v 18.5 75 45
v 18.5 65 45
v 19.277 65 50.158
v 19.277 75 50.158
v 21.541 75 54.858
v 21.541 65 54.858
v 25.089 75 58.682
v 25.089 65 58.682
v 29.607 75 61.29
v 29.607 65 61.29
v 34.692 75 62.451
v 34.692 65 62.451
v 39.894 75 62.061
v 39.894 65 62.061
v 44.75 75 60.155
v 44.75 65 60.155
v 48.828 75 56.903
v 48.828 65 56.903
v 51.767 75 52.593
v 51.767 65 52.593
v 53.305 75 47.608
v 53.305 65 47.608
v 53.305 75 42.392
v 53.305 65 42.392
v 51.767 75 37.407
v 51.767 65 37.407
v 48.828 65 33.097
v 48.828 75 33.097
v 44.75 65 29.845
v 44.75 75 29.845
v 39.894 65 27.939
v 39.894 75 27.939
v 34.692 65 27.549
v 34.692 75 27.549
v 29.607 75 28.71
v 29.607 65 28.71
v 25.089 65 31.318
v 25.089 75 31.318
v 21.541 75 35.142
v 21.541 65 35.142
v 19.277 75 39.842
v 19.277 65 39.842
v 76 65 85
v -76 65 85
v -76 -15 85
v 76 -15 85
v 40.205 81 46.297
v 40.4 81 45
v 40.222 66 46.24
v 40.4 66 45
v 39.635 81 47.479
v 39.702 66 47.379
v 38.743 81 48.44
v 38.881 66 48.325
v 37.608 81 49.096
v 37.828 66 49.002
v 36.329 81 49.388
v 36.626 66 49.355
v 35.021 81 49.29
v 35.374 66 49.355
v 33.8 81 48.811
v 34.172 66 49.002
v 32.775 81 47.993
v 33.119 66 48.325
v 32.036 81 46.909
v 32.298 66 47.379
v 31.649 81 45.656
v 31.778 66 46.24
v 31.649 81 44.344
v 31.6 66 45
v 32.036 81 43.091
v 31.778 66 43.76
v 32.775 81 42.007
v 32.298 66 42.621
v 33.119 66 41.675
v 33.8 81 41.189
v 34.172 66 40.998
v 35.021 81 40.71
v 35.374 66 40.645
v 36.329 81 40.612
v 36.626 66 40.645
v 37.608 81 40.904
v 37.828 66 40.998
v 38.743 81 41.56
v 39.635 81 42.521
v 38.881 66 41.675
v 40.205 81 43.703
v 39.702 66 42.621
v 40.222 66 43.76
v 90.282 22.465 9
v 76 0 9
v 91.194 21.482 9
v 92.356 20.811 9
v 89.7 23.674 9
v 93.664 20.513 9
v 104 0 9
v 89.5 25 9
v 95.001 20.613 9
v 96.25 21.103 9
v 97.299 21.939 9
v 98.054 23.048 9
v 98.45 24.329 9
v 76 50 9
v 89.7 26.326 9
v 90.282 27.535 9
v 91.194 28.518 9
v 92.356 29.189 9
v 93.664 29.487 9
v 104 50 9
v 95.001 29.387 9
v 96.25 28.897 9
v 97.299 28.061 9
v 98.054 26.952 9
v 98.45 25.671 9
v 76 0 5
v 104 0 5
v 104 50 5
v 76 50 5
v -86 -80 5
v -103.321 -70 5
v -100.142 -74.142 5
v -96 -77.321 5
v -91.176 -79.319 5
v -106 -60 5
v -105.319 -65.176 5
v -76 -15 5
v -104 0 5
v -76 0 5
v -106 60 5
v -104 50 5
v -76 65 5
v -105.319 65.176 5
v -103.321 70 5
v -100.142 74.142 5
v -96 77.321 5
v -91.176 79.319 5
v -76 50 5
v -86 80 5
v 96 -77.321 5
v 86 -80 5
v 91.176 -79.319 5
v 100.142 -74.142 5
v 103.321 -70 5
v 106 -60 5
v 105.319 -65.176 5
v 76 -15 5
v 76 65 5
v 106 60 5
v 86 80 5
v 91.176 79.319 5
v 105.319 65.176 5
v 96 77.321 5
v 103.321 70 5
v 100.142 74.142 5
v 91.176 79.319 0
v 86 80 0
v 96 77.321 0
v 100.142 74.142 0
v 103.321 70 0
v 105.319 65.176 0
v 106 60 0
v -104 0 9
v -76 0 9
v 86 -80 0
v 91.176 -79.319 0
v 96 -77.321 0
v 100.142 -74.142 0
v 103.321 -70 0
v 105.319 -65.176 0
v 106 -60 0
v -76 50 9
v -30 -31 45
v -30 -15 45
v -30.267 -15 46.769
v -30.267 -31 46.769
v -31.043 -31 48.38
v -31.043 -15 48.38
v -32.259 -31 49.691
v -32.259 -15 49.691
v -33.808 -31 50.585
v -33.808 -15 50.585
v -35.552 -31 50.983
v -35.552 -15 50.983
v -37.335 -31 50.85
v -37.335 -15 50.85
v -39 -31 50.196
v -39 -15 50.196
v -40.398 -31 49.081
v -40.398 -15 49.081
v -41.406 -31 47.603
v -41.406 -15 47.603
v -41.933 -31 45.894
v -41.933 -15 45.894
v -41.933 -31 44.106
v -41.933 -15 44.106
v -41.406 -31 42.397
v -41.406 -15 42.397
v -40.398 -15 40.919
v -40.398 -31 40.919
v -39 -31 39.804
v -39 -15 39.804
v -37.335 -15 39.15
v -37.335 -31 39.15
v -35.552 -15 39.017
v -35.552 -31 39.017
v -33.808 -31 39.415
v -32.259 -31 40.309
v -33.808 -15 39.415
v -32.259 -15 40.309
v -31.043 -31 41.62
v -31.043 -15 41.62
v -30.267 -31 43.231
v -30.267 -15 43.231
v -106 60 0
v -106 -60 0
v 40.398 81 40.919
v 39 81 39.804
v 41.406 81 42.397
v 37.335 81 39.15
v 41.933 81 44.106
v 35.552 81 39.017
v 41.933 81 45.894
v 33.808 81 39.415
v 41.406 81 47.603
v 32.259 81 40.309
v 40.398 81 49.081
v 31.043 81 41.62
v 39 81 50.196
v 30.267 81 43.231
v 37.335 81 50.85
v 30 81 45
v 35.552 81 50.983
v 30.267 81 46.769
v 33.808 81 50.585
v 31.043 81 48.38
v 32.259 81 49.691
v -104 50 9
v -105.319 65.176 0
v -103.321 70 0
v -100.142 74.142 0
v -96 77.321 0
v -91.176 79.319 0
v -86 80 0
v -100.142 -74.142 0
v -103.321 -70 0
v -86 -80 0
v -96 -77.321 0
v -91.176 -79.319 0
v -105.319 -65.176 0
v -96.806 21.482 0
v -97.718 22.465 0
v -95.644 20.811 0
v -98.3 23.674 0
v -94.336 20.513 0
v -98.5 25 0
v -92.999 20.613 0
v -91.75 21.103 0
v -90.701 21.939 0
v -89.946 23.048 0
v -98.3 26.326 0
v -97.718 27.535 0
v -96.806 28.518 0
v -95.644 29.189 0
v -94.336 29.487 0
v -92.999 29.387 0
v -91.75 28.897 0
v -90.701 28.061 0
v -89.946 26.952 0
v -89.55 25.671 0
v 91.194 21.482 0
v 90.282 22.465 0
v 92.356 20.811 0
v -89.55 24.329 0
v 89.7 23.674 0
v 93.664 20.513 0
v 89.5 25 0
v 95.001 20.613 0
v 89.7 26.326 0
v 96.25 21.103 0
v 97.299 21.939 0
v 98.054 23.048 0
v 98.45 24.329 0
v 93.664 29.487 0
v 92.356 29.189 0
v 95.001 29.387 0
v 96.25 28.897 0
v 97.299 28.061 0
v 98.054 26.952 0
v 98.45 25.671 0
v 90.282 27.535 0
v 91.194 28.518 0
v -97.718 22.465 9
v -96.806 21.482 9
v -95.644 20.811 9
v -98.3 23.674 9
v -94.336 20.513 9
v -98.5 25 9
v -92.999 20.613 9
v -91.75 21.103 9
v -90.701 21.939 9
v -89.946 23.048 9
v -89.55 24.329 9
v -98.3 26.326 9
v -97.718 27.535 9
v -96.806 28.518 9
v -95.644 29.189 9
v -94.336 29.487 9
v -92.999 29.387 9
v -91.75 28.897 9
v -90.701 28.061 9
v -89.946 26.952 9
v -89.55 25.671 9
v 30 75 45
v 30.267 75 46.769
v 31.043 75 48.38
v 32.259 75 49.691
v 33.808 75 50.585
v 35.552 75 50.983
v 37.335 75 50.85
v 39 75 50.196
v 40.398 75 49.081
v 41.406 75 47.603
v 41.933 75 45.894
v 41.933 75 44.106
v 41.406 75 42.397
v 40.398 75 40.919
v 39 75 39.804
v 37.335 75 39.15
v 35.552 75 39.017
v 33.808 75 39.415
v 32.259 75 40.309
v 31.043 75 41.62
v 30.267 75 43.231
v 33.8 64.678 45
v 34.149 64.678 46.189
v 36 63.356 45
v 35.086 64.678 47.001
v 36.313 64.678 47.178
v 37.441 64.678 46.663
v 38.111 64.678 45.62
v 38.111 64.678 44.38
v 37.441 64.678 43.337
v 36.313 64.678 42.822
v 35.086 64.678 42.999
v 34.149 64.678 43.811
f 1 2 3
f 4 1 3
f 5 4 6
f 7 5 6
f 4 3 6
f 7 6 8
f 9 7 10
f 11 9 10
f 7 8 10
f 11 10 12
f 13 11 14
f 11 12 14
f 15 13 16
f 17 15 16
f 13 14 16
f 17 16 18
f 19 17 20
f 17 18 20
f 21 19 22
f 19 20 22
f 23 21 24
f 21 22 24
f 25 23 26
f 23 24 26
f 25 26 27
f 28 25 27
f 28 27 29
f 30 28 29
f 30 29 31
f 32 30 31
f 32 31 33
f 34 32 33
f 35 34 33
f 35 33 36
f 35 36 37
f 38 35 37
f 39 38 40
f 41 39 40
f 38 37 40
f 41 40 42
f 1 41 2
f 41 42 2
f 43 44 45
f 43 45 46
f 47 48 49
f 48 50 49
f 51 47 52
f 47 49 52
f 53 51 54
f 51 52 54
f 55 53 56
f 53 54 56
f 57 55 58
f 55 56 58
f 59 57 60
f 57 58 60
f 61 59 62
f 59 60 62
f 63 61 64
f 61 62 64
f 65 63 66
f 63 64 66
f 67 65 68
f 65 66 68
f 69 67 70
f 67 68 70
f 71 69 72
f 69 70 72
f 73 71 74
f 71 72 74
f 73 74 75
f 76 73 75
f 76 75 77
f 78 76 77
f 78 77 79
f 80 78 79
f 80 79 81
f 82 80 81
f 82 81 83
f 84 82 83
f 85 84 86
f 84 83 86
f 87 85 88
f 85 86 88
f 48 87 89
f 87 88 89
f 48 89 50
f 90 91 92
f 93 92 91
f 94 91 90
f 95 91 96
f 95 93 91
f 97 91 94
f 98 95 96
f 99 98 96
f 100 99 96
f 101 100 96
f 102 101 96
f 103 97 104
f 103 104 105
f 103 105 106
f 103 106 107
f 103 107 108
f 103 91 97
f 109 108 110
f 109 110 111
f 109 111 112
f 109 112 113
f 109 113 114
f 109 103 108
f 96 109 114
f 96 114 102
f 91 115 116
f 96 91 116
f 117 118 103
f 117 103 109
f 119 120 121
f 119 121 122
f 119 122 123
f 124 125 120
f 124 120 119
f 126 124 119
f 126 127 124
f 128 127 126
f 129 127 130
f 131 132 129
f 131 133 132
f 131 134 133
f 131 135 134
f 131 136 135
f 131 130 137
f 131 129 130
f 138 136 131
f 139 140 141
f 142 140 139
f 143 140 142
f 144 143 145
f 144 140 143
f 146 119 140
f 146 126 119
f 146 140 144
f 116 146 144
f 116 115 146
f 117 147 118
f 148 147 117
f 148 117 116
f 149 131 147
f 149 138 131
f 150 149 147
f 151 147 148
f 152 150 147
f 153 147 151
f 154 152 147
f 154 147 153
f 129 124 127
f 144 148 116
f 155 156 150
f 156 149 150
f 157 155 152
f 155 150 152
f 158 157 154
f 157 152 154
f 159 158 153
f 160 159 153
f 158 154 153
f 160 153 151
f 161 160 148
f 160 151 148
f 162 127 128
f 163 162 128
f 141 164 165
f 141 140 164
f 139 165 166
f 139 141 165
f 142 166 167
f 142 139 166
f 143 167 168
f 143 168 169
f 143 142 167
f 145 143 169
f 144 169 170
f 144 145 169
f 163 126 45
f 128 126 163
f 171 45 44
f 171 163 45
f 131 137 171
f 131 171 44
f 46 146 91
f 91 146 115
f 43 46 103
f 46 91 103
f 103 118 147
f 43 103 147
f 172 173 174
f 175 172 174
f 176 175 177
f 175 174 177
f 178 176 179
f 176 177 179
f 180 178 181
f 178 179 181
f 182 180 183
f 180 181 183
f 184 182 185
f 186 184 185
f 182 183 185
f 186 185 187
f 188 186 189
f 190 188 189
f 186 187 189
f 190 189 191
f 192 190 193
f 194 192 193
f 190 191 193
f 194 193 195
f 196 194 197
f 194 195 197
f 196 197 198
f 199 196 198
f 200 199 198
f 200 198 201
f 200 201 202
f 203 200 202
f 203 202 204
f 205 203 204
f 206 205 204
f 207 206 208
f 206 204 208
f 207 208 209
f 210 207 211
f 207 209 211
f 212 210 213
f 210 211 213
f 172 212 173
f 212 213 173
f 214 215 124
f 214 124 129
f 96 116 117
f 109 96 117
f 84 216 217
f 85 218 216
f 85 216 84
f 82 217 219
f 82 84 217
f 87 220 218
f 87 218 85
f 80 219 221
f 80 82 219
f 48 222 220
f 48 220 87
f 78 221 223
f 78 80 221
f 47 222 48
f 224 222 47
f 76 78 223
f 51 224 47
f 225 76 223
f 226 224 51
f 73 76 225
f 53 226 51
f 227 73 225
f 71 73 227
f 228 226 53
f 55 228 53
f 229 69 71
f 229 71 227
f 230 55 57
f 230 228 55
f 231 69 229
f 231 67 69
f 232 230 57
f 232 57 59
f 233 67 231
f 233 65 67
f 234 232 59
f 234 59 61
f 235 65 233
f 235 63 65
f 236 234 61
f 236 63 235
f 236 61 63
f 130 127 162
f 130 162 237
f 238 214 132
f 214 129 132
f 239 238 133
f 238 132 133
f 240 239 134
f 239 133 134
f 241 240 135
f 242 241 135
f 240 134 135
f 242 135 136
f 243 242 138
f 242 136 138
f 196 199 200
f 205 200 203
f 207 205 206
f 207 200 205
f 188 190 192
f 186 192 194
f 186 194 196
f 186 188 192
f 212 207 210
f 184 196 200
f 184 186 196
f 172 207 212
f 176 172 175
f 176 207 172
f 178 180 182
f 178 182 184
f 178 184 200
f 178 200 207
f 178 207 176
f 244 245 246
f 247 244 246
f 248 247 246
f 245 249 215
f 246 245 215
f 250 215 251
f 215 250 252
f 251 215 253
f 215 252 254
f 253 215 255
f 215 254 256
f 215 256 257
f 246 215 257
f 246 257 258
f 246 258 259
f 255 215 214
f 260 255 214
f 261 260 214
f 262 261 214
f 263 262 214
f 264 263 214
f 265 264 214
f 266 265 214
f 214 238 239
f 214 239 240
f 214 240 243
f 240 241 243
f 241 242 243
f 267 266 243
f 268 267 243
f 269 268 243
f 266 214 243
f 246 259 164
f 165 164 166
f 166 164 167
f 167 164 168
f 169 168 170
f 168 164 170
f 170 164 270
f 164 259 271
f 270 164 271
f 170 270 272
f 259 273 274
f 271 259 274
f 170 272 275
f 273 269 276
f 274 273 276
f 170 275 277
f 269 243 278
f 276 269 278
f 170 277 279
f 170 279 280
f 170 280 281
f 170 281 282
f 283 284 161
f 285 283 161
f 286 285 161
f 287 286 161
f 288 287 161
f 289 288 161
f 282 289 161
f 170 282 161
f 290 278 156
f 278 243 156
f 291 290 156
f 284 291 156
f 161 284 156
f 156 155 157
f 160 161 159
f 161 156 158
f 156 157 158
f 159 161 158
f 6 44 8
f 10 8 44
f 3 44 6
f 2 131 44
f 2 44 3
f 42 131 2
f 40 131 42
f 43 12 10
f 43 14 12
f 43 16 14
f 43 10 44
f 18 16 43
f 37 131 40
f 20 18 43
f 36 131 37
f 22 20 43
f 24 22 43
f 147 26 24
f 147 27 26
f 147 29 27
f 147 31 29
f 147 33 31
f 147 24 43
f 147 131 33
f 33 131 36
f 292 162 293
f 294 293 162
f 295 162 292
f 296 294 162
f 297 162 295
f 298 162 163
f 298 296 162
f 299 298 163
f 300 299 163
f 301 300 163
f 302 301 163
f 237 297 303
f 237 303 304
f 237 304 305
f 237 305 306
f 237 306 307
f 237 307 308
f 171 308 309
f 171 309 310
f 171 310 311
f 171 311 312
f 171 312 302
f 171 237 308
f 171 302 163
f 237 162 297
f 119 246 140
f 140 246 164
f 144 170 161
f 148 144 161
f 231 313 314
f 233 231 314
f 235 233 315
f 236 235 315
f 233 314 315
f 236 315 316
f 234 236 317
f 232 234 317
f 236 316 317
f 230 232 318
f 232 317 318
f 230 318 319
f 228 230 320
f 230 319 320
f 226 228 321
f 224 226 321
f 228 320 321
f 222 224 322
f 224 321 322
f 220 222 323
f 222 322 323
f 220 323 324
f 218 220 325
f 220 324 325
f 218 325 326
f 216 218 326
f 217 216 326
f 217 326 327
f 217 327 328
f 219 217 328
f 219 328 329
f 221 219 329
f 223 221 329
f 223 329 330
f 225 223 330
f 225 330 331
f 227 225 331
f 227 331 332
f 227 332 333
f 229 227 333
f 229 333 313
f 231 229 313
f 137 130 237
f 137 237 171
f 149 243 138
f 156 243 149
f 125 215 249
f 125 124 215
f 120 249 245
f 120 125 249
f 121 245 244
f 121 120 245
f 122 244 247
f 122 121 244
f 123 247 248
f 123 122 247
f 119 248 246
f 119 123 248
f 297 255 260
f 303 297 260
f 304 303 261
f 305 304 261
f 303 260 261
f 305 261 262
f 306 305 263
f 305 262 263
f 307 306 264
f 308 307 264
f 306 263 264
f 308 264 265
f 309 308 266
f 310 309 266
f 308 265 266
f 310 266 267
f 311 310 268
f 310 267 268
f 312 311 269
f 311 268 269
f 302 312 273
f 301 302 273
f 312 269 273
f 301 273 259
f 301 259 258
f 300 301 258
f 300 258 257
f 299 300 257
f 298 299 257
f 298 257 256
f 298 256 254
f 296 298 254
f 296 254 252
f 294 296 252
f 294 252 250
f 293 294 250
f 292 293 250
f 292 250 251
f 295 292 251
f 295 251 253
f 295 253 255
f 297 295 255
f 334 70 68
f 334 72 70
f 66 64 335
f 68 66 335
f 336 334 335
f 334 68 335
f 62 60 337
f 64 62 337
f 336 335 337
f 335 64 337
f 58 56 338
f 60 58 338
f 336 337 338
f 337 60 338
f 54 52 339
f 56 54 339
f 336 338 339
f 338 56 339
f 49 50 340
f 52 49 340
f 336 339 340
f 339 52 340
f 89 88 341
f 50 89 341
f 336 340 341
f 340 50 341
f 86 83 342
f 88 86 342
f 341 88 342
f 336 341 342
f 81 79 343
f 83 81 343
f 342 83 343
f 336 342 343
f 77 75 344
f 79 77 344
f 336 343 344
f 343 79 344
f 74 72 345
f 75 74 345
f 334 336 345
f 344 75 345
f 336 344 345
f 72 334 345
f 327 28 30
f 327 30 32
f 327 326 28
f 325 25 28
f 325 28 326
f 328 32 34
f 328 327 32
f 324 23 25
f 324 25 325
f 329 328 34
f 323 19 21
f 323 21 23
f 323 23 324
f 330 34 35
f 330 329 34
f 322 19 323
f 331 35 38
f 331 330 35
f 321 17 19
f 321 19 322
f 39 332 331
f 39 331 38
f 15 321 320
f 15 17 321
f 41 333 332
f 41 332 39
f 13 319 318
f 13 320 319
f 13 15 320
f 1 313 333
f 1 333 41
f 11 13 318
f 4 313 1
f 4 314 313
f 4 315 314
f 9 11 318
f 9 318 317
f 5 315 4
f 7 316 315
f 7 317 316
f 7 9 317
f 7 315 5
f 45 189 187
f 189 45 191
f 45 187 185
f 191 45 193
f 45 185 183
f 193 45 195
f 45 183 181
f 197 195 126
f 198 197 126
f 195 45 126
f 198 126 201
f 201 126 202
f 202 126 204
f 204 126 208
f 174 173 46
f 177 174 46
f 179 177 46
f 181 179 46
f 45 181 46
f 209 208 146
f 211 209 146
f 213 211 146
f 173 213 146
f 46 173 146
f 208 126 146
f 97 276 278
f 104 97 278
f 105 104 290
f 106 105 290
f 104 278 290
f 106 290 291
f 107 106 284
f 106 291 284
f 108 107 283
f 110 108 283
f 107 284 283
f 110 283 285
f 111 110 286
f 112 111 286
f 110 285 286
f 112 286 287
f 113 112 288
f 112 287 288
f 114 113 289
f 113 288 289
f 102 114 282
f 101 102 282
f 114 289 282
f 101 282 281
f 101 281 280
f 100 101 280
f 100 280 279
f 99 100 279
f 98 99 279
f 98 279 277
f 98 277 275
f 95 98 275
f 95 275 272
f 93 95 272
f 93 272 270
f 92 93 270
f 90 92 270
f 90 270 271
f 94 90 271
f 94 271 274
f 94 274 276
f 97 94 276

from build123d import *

# Parameters (mm, degrees)
F0_W      = 212
F0_H      = 160
F1_DEPTH  = 5
F2_W      = 152
F2_H      = 80
F3_DEPTH  = 80
F4_R      = 6
F5_DEPTH  = 16
F6_R      = 6
F7_DEPTH  = 16
F9_D      = 8.8
F9_DEPTH  = 15
F9_TIP    = 2.6437867237
F10_R     = 20
F11_R     = 17.5
F11_R_2   = 6
F12_DEPTH = 10
F13_W     = 28
F13_H     = 50
F14_DEPTH = 4
F16_D     = 9
F16_DEPTH = 15
F16_TIP   = 2.7038727856


with BuildPart() as f1:
    # F0 (on Top) → F1 (new body)
    with BuildSketch(Plane.XY):
        Rectangle(F0_W, F0_H)
    extrude(amount=F1_DEPTH)

    # F2 (on face) → F3 (join)
    with BuildSketch(Plane.XY.offset(5)):
        with Locations((0, 25)):
            Rectangle(F2_W, F2_H)
    extrude(amount=F3_DEPTH)

    # F4 (on face) → F5 (join)
    with BuildSketch(Plane.XZ.offset(15)):
        with Locations((-36, 45)):
            Circle(F4_R)
    extrude(amount=F5_DEPTH)

    # F6 (on face) → F7 (join)
    with BuildSketch(Plane(origin=(0, 65, 0), x_dir=(-1, 0, 0), z_dir=(0, 1, 0))):
        with Locations((-36, 45)):
            Circle(F6_R)
    extrude(amount=F7_DEPTH)

    # F9
    with Locations(Plane(origin=(0, 81, 0), x_dir=(-1, 0, 0), z_dir=(0, 1, 0))):
        with Locations((-36, 45)):
            Hole(F9_D / 2, depth=F9_DEPTH)
            with Locations((0, 0, -(F9_DEPTH + F9_TIP / 2))):  # 118° drill point
                Cone(0, F9_D / 2, F9_TIP, mode=Mode.SUBTRACT)

    # F10
    f10_edges = [f1.edges().sort_by_distance(p)[0] for p in [
        (106, -80, 2.5),
        (106, 80, 2.5),
        (-106, 80, 2.5),
        (-106, -80, 2.5),
    ]]
    fillet(f10_edges, radius=F10_R)

    # F11 (on face) → F12 (join)
    with BuildSketch(Plane(origin=(0, 65, 0), x_dir=(-1, 0, 0), z_dir=(0, 1, 0))):
        with Locations((-36, 45)):
            Circle(F11_R)
        with Locations((-36, 45)):
            Circle(F11_R_2, mode=Mode.SUBTRACT)
    extrude(amount=F12_DEPTH)

    # F13 (on face) → F14 (join)
    with BuildSketch(Plane.XY.offset(5)):
        with Locations((-90, 25)):
            Rectangle(F13_W, F13_H)
        with Locations((90, 25)):
            Rectangle(F13_W, F13_H)
    extrude(amount=F14_DEPTH)

    # F16
    with Locations(Plane.XY.offset(9)):
        with Locations((-94, 25), (94, 25)):
            Hole(F16_D / 2, depth=F16_DEPTH)
            with Locations((0, 0, -(F16_DEPTH + F16_TIP / 2))):  # 118° drill point
                Cone(0, F16_D / 2, F16_TIP, mode=Mode.SUBTRACT)


solid = f1.part
